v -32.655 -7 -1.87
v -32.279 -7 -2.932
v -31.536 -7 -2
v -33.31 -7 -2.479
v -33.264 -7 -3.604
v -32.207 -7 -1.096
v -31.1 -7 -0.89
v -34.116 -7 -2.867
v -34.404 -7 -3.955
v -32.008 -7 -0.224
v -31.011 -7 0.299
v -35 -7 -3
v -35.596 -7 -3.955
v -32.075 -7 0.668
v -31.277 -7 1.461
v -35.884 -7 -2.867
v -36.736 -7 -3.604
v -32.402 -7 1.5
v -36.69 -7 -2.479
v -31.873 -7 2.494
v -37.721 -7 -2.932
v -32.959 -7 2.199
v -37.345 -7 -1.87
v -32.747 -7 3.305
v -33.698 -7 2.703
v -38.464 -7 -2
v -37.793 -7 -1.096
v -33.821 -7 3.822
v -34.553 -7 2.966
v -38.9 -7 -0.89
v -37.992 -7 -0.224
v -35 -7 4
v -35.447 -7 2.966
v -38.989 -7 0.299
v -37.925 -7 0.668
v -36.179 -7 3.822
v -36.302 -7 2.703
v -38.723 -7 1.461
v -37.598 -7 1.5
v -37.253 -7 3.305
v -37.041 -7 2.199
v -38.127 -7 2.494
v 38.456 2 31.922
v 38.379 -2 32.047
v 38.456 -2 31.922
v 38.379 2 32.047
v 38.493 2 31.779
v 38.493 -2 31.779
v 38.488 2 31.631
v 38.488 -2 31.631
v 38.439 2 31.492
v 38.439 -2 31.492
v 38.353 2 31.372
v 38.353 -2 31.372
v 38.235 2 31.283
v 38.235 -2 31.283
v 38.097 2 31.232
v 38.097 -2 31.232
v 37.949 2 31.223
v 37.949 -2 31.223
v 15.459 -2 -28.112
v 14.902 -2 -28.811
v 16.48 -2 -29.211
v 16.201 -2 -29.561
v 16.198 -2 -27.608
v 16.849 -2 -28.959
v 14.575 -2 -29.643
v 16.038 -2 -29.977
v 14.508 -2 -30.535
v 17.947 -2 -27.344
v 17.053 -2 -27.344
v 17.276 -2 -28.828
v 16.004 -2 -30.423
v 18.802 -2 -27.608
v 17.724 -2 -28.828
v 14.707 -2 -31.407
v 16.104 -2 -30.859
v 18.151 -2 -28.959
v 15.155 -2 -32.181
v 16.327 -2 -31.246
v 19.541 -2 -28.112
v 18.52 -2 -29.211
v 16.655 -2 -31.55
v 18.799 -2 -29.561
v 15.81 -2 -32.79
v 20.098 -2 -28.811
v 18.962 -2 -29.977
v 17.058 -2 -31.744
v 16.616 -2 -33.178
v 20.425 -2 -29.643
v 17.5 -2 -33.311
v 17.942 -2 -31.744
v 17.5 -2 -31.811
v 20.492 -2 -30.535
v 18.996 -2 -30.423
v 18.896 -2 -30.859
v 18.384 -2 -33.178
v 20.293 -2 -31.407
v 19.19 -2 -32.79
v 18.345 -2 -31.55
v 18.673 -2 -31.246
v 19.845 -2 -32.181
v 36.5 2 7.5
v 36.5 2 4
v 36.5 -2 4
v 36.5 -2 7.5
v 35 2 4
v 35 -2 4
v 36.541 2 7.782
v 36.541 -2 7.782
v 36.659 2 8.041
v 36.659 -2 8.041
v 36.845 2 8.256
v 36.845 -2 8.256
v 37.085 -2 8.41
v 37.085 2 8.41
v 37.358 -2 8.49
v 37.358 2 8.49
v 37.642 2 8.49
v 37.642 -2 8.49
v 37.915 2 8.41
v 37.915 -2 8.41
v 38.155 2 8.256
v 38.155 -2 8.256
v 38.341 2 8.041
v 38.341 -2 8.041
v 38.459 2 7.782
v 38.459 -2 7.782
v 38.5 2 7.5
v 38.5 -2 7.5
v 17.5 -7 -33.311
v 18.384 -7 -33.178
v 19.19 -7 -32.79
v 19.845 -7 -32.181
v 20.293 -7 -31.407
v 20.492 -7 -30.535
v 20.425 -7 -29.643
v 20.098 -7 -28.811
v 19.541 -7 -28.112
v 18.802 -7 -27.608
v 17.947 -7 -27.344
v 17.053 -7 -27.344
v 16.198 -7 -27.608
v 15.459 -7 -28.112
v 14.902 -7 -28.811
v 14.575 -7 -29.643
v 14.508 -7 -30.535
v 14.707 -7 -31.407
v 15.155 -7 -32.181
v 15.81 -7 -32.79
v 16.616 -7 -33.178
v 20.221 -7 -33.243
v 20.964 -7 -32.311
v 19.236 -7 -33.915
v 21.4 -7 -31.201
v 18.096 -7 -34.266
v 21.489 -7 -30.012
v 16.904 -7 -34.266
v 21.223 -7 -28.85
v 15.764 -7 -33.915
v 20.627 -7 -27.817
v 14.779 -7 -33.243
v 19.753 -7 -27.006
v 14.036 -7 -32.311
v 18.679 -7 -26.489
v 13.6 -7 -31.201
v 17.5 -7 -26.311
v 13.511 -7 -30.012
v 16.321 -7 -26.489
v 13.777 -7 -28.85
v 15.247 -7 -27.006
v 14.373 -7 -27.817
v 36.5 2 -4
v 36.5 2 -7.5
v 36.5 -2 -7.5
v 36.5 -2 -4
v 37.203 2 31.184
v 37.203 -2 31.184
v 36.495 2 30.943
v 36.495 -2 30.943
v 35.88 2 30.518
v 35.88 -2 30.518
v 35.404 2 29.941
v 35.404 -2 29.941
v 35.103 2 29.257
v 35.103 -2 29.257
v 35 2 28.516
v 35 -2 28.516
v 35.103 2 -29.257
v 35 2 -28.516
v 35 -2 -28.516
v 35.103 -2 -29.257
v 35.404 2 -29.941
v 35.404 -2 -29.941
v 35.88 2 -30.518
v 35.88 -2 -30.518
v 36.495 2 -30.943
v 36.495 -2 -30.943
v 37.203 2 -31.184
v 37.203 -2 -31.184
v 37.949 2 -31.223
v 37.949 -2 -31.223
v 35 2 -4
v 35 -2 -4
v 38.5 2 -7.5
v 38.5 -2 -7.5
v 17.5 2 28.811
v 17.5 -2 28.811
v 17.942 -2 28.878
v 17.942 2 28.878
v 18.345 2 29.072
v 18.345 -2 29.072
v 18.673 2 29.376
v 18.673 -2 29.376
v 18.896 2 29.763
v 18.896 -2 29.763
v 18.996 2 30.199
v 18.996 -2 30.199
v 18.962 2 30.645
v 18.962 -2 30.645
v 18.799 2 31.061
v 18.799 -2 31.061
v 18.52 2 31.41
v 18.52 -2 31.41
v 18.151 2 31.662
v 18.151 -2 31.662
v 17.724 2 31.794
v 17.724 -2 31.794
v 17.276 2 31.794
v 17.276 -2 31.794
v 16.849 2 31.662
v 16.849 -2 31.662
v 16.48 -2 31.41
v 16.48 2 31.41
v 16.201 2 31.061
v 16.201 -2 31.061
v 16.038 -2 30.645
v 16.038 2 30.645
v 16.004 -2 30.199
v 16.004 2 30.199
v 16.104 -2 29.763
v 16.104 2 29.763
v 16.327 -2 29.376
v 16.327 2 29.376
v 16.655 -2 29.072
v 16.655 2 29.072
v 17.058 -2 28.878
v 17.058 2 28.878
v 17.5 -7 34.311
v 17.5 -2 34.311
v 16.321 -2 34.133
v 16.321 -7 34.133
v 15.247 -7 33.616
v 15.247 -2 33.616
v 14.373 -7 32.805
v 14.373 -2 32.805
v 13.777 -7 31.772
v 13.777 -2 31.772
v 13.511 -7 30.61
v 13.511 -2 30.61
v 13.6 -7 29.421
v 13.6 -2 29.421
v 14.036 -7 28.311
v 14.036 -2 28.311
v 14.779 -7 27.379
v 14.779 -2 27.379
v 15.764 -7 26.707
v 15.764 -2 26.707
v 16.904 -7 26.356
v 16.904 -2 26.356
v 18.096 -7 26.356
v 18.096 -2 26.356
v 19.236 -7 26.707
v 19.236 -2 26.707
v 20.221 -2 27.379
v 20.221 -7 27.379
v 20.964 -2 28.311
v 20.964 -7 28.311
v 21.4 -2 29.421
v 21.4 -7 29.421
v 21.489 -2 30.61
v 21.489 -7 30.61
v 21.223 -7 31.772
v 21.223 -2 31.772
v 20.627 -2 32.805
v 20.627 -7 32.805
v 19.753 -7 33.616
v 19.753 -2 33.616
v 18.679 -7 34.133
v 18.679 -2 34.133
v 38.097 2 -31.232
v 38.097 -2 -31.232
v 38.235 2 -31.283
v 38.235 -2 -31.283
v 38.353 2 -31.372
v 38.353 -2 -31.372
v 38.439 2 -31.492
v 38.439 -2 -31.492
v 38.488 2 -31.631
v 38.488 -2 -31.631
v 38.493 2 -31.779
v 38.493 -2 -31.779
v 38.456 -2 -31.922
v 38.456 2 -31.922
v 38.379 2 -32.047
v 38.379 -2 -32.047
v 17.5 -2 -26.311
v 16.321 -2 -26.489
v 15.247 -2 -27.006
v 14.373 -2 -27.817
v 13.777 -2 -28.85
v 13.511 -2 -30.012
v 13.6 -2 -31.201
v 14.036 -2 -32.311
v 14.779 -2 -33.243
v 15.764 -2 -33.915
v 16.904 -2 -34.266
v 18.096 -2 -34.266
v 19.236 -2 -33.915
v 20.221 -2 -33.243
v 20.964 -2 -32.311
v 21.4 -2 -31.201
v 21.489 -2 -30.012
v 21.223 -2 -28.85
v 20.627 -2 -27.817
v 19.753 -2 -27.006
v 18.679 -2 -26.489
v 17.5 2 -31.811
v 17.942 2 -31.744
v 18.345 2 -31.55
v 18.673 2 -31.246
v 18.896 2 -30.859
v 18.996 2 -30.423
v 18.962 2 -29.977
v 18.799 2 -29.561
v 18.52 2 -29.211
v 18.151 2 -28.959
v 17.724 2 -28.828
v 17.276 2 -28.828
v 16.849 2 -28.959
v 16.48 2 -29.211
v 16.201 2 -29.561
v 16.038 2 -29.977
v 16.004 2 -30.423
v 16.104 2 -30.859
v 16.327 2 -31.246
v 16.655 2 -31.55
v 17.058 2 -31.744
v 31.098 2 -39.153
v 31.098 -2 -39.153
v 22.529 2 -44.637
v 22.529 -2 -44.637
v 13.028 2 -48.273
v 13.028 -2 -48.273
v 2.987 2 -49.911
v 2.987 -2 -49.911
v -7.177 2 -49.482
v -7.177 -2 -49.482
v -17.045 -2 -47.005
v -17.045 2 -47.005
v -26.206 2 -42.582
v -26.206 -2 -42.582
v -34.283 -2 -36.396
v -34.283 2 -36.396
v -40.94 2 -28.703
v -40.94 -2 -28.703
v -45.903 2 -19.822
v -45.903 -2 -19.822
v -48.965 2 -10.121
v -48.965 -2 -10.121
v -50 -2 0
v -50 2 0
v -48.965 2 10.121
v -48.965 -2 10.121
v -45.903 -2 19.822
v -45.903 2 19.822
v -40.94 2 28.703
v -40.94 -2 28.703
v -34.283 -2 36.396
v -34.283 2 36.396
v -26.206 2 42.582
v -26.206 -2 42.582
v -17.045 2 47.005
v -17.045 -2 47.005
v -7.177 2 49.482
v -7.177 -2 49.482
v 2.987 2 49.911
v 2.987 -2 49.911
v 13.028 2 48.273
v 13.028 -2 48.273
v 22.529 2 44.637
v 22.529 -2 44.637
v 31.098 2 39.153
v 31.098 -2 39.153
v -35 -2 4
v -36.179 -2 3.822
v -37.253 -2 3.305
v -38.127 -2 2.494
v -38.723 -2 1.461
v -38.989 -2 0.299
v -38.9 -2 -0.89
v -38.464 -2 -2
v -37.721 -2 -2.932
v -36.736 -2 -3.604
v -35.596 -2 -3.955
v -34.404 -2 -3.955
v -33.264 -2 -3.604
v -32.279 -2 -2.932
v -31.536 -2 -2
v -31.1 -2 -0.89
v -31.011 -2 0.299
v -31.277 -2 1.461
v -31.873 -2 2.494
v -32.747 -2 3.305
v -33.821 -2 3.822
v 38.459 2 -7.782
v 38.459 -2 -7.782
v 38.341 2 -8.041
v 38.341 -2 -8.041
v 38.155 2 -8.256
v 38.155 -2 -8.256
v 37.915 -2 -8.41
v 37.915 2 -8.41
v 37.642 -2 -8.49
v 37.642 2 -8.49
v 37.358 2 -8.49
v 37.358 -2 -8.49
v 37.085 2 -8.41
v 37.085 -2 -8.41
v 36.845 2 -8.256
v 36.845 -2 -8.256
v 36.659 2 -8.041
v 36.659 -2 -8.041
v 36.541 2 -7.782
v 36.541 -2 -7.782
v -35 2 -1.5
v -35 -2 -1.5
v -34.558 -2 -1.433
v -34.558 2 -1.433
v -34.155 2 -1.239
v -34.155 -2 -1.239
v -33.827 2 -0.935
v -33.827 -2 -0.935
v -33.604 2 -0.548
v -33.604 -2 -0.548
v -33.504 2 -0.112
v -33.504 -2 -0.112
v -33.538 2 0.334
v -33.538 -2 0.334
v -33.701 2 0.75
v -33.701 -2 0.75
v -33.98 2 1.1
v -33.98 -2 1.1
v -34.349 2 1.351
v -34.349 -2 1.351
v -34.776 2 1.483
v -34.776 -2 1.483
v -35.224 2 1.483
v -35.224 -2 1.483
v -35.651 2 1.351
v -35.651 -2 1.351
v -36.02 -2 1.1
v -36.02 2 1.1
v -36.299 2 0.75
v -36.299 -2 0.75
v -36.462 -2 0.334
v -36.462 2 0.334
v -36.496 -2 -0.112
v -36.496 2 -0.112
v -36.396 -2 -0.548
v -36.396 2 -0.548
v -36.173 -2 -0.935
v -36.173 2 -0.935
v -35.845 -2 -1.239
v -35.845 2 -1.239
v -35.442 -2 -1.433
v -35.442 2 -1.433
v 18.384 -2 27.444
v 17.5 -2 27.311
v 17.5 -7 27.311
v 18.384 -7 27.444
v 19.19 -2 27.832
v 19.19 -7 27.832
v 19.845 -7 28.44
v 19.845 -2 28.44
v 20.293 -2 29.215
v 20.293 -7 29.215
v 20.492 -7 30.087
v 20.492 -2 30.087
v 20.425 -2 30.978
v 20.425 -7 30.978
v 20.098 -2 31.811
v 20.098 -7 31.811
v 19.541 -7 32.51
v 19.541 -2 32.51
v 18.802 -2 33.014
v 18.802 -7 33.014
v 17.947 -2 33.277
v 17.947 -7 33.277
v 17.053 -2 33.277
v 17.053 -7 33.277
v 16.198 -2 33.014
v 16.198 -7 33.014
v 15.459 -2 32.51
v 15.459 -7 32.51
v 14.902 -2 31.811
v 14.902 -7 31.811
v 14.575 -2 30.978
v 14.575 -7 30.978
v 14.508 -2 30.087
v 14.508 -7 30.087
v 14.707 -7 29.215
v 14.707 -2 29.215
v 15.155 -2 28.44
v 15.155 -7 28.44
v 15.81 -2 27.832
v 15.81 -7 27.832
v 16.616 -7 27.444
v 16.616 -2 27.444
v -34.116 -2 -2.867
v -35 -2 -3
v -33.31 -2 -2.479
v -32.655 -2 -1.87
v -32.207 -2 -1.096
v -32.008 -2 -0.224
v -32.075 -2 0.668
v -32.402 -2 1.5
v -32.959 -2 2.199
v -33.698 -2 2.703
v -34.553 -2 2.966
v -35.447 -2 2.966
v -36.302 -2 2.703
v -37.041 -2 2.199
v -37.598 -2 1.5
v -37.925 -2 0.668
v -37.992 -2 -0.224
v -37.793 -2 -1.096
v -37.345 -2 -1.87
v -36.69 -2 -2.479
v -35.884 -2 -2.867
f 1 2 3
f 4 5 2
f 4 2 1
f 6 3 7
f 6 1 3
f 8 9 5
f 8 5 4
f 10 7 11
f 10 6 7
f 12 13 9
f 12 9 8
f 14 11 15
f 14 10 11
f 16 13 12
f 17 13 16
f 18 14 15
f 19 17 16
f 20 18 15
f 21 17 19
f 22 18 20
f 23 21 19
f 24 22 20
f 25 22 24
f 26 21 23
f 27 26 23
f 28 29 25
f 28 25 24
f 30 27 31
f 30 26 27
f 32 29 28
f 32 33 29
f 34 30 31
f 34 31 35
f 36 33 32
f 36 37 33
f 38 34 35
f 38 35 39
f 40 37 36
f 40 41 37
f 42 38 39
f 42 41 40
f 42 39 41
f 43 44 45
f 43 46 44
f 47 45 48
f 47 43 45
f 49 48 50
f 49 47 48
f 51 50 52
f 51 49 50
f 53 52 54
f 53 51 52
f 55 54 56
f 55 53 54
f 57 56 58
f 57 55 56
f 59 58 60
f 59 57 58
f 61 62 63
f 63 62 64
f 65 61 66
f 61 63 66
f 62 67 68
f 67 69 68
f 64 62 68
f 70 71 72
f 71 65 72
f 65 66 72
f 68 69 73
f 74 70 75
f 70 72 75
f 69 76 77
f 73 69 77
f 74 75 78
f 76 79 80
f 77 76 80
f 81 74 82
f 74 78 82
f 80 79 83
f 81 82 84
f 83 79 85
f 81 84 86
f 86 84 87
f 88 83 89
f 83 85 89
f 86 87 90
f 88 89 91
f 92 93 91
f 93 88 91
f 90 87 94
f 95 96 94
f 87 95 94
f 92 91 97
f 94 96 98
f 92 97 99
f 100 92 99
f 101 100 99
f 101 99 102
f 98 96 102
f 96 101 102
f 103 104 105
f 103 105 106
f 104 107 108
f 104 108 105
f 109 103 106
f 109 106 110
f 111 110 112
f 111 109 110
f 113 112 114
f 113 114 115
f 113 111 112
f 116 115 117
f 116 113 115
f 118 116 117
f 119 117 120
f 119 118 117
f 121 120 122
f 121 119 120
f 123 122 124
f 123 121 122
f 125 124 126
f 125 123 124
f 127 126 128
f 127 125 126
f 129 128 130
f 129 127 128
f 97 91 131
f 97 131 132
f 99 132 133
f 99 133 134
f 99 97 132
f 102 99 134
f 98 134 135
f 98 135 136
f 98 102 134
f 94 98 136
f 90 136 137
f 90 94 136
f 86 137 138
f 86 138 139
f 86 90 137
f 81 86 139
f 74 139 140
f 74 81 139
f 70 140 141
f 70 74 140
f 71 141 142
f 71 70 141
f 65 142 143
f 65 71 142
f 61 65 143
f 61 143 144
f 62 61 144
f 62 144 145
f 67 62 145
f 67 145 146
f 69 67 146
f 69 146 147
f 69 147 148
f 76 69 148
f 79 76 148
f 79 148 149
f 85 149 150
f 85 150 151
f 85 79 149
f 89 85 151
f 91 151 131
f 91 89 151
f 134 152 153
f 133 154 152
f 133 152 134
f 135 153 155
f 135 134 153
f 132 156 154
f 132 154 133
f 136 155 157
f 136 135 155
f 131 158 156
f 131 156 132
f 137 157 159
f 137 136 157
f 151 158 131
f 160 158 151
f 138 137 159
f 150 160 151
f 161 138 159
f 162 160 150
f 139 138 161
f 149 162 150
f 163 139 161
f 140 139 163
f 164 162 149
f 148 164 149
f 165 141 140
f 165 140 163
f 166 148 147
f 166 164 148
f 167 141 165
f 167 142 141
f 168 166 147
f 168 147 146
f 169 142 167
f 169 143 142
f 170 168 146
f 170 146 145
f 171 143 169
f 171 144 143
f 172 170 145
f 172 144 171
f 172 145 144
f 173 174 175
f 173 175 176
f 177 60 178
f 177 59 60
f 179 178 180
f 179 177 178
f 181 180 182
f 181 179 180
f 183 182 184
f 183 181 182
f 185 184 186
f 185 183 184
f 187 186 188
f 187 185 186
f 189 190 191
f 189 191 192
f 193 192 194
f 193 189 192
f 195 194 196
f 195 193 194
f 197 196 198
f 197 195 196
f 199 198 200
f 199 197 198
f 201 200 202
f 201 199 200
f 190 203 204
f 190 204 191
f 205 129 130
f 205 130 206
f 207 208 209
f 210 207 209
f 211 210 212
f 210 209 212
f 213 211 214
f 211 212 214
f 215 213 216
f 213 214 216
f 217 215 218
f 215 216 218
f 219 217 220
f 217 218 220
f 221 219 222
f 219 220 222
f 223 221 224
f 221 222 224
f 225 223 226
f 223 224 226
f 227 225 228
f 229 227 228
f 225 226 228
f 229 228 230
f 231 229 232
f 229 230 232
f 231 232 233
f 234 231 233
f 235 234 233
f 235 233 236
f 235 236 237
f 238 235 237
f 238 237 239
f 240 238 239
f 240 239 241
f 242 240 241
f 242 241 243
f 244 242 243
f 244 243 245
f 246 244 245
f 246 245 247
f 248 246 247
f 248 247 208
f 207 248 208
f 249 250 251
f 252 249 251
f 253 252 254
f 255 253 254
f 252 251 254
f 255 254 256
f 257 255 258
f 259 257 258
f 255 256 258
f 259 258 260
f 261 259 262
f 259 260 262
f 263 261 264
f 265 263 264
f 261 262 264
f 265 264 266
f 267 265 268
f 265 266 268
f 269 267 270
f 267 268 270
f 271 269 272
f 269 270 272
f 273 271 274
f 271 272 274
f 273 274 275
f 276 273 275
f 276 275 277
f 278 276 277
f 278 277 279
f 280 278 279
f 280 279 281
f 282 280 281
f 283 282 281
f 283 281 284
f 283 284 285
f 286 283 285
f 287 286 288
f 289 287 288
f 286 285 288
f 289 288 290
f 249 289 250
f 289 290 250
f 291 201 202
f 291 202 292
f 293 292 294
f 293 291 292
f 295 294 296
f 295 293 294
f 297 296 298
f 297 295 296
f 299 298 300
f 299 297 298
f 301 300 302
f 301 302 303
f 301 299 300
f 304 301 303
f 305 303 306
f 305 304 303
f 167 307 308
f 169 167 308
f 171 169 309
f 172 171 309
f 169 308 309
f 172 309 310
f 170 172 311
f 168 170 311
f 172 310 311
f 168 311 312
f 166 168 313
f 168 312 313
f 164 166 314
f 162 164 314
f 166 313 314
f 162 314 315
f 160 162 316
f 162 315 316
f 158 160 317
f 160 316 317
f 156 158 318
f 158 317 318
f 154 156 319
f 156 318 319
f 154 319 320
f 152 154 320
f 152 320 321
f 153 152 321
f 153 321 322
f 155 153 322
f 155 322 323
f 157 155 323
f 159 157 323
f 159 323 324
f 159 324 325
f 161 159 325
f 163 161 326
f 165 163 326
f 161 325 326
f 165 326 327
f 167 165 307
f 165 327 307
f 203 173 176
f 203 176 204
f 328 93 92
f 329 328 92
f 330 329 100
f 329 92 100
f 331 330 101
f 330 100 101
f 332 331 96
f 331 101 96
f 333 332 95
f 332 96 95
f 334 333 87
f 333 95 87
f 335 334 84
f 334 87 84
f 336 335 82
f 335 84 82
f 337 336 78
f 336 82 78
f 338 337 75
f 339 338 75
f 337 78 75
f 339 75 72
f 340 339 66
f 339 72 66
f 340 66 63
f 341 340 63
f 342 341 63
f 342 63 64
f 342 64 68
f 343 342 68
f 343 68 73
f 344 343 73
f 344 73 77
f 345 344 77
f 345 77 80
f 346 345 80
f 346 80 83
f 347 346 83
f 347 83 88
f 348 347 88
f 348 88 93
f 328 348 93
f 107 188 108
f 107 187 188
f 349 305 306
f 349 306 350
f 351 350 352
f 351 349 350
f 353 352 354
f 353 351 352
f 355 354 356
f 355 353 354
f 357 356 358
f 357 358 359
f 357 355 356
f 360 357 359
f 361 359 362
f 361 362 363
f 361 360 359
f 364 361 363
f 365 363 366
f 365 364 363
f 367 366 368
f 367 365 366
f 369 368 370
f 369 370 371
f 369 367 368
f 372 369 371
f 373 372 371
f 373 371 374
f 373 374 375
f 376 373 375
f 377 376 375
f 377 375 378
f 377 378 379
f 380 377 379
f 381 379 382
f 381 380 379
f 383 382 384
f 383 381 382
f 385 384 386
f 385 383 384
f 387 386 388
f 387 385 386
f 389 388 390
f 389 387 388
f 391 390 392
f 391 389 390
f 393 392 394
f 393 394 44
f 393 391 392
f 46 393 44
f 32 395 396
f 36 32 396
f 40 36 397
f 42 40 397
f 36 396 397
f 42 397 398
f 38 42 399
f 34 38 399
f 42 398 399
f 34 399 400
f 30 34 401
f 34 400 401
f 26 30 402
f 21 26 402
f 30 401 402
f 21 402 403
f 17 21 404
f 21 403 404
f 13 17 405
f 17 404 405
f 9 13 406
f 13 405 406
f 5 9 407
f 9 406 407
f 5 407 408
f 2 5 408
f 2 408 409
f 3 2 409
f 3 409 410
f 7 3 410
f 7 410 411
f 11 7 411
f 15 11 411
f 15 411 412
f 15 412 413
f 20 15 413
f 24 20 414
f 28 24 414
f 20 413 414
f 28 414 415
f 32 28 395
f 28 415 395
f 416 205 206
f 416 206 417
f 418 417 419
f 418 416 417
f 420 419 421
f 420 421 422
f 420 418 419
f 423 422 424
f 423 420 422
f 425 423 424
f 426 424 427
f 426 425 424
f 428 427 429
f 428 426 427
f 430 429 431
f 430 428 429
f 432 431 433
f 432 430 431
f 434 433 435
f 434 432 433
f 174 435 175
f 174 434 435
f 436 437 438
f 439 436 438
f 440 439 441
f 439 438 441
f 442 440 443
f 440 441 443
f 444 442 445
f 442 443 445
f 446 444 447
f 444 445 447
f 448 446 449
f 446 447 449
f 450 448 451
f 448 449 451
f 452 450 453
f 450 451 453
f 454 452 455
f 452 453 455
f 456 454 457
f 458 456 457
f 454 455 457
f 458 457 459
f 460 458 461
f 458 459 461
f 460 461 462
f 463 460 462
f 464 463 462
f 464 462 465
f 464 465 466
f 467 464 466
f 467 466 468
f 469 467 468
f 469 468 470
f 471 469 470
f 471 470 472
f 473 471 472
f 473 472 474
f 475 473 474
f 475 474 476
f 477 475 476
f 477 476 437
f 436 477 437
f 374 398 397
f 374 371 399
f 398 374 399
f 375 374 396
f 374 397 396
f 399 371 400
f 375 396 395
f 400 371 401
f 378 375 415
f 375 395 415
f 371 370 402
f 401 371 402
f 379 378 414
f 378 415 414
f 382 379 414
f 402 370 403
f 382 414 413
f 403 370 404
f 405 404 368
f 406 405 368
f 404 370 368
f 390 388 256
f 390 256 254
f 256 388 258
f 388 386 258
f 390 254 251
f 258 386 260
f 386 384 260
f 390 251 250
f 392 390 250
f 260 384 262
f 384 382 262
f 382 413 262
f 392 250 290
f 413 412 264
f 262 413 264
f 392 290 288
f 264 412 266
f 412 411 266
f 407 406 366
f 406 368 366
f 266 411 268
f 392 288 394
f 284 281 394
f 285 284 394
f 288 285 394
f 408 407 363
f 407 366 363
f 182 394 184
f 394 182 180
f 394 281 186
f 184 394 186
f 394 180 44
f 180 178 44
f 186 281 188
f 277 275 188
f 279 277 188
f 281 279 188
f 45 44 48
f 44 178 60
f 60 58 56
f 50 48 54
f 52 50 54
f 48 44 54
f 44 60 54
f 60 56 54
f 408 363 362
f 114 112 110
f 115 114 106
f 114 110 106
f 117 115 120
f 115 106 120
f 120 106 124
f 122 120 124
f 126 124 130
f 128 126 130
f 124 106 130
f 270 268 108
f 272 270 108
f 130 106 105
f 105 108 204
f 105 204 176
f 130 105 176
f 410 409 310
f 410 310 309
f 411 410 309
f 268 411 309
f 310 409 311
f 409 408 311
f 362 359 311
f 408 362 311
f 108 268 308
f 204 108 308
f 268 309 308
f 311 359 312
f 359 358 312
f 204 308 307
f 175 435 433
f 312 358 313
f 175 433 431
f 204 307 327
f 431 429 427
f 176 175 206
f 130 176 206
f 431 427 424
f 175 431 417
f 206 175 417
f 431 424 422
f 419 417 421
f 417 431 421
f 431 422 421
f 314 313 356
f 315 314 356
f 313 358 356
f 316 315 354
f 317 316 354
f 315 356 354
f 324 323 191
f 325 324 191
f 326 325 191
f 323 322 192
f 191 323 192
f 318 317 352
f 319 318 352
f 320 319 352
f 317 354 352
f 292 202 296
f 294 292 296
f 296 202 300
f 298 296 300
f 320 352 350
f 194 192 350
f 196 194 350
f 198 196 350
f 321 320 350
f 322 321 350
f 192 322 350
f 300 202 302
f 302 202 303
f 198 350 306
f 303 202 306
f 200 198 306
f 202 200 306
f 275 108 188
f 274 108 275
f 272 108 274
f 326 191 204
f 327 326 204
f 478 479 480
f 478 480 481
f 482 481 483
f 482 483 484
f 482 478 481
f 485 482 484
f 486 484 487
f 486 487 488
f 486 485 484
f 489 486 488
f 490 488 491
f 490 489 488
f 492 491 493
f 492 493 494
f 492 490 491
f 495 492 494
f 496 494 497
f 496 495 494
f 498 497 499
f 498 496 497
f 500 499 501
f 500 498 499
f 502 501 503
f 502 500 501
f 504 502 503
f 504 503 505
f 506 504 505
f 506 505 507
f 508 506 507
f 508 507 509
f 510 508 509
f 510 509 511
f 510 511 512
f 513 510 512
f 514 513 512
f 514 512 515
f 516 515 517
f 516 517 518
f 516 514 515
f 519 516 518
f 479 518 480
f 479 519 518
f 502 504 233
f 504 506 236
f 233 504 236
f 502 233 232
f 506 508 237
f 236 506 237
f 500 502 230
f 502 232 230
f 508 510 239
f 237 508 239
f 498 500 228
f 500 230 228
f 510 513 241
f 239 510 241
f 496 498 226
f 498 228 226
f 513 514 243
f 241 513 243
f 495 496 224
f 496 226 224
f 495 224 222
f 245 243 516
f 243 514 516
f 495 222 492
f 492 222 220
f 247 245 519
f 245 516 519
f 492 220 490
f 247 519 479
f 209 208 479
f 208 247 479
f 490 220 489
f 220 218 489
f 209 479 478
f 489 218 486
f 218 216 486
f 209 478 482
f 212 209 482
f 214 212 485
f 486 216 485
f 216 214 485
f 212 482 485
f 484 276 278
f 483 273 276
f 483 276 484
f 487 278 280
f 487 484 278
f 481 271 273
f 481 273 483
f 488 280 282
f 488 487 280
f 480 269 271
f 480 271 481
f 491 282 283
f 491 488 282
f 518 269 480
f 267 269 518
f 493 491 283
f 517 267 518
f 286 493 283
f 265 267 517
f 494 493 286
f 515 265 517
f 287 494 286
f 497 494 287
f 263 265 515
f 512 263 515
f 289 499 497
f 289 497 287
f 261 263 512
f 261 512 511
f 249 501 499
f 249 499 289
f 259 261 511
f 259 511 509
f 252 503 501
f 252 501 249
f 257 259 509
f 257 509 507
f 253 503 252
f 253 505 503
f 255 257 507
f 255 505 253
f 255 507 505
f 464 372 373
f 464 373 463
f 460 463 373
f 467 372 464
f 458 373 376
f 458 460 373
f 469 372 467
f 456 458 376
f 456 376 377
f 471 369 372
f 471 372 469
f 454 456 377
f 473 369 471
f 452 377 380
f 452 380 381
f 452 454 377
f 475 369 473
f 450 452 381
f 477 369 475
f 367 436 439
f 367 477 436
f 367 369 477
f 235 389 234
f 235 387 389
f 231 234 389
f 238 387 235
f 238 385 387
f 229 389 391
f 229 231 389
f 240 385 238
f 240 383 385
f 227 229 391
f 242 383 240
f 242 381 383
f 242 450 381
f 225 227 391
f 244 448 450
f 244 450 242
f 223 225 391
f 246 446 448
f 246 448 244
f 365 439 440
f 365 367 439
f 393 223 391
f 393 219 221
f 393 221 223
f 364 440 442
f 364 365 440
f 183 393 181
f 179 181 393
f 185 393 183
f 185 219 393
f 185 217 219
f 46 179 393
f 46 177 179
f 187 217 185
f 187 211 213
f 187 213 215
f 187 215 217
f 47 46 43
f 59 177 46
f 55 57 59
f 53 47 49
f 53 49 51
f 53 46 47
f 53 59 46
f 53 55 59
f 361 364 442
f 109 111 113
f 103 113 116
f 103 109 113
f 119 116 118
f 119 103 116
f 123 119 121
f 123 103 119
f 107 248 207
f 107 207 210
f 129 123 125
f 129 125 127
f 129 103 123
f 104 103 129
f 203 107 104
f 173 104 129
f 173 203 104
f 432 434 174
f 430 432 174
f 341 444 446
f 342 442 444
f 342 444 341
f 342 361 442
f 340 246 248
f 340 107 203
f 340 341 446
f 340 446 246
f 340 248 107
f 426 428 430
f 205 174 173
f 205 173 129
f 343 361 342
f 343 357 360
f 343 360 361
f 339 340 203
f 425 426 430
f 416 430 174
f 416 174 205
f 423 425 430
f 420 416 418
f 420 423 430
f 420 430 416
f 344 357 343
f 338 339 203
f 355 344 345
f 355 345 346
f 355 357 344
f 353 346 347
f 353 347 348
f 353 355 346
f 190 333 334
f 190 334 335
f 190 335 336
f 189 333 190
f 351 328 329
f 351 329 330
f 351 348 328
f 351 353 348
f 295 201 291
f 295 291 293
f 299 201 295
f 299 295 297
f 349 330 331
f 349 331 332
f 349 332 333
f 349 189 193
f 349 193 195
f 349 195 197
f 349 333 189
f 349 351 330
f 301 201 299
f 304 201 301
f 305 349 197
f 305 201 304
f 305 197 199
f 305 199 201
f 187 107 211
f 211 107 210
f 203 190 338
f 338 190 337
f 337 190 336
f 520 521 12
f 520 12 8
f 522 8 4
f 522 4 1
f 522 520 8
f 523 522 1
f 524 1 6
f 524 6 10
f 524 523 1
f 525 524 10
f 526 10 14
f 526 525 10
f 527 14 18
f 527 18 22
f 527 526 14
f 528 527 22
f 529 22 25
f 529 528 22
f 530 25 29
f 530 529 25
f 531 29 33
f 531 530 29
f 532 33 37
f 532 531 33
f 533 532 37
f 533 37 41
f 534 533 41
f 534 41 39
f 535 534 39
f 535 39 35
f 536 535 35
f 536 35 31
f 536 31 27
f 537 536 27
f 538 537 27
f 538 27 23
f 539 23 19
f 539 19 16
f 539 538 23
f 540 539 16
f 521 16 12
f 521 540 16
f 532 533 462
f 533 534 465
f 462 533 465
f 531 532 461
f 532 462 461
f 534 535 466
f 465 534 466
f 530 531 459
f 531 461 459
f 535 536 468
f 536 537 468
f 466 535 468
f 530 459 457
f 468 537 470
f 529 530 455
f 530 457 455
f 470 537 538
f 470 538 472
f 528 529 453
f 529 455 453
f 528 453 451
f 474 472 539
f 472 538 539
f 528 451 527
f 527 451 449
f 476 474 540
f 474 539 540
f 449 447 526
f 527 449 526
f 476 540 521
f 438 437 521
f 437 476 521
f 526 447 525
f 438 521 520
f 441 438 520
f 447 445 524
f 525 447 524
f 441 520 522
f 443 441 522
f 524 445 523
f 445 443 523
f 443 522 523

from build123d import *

# Parameters (mm, degrees)
SALIENTE_EXTRUIR1_DEPTH = 2
CROQUIS2_R              = 1.5
CORTAR_EXTRUIR1_DEPTH   = 7
CROQUIS3_R              = 4
CROQUIS3_R_2            = 3
SALIENTE_EXTRUIR2_DEPTH = 5


with BuildPart() as part:
    # Croquis1 → Saliente-Extruir1 (new, symmetric)
    with BuildSketch(Plane(origin=(0, 0, 0), x_dir=(1, 0, 0), z_dir=(0, 1, 0))):
        with BuildLine():
            Line((35, -28.516113802), (35, -4))
            Line((35, -4), (36.5, -4))
            Line((36.5, -4), (36.5, -7.5))
            ThreePointArc((36.5, -7.5), (37.5, -8.5), (38.5, -7.5))
            Line((38.5, -7.5), (38.5, 7.5))
            ThreePointArc((38.5, 7.5), (37.5, 8.5), (36.5, 7.5))
            Line((36.5, 7.5), (36.5, 4))
            Line((36.5, 4), (35, 4))
            Line((35, 4), (35, 28.516113802))
            ThreePointArc((35, 28.516113802), (35.879823326, 30.517678888), (37.949409202, 31.222779006))
            ThreePointArc((37.949409202, 31.222779006), (38.439227262, 31.49182987), (38.37918033, 32.047441664))
            ThreePointArc((38.37918033, 32.047441664), (-50, 0), (38.37918033, -32.047441664))
            ThreePointArc((38.37918033, -32.047441664), (38.439227262, -31.49182987), (37.949409202, -31.222779006))
            ThreePointArc((37.949409202, -31.222779006), (35.879823326, -30.517678888), (35, -28.516113802))
        make_face()
    extrude(amount=SALIENTE_EXTRUIR1_DEPTH, both=True)

    # Croquis2 → Cortar-Extruir1 (cut)
    with BuildSketch(Plane.XZ.offset(2)):
        with Locations(Location((17.5, 30.310889132, 0), (0, 0, 270))):
            Circle(CROQUIS2_R)
        with Locations(Location((-35, 0, 0), (0, 0, 270))):
            Circle(CROQUIS2_R)
        with Locations(Location((17.5, -30.310889132, 0), (0, 0, 270))):
            Circle(CROQUIS2_R)
    extrude(amount=-CORTAR_EXTRUIR1_DEPTH, mode=Mode.SUBTRACT)

    # Croquis3 → Saliente-Extruir2 (add)
    # profile 1 of 3: a face of its own
    with BuildSketch(Plane.XZ.offset(2)):
        with Locations(Location((-35, 0, 0), (0, 0, 90))):
            Circle(CROQUIS3_R)
        with Locations(Location((-35, 0, 0), (0, 0, 270))):
            Circle(CROQUIS3_R_2, mode=Mode.SUBTRACT)
    # profile 2 of 3: a face of its own
    with BuildSketch(Plane.XZ.offset(2)):
        with Locations(Location((17.5, 30.310889132, 0), (0, 0, 90))):
            Circle(CROQUIS3_R)
        with Locations(Location((17.5, 30.310889132, 0), (0, 0, 270))):
            Circle(CROQUIS3_R_2, mode=Mode.SUBTRACT)
    # profile 3 of 3: a face of its own
    with BuildSketch(Plane.XZ.offset(2)):
        with Locations(Location((17.5, -30.310889132, 0), (0, 0, 90))):
            Circle(CROQUIS3_R)
        with Locations(Location((17.5, -30.310889132, 0), (0, 0, 270))):
            Circle(CROQUIS3_R_2, mode=Mode.SUBTRACT)
    extrude(amount=SALIENTE_EXTRUIR2_DEPTH)


solid = part.part
